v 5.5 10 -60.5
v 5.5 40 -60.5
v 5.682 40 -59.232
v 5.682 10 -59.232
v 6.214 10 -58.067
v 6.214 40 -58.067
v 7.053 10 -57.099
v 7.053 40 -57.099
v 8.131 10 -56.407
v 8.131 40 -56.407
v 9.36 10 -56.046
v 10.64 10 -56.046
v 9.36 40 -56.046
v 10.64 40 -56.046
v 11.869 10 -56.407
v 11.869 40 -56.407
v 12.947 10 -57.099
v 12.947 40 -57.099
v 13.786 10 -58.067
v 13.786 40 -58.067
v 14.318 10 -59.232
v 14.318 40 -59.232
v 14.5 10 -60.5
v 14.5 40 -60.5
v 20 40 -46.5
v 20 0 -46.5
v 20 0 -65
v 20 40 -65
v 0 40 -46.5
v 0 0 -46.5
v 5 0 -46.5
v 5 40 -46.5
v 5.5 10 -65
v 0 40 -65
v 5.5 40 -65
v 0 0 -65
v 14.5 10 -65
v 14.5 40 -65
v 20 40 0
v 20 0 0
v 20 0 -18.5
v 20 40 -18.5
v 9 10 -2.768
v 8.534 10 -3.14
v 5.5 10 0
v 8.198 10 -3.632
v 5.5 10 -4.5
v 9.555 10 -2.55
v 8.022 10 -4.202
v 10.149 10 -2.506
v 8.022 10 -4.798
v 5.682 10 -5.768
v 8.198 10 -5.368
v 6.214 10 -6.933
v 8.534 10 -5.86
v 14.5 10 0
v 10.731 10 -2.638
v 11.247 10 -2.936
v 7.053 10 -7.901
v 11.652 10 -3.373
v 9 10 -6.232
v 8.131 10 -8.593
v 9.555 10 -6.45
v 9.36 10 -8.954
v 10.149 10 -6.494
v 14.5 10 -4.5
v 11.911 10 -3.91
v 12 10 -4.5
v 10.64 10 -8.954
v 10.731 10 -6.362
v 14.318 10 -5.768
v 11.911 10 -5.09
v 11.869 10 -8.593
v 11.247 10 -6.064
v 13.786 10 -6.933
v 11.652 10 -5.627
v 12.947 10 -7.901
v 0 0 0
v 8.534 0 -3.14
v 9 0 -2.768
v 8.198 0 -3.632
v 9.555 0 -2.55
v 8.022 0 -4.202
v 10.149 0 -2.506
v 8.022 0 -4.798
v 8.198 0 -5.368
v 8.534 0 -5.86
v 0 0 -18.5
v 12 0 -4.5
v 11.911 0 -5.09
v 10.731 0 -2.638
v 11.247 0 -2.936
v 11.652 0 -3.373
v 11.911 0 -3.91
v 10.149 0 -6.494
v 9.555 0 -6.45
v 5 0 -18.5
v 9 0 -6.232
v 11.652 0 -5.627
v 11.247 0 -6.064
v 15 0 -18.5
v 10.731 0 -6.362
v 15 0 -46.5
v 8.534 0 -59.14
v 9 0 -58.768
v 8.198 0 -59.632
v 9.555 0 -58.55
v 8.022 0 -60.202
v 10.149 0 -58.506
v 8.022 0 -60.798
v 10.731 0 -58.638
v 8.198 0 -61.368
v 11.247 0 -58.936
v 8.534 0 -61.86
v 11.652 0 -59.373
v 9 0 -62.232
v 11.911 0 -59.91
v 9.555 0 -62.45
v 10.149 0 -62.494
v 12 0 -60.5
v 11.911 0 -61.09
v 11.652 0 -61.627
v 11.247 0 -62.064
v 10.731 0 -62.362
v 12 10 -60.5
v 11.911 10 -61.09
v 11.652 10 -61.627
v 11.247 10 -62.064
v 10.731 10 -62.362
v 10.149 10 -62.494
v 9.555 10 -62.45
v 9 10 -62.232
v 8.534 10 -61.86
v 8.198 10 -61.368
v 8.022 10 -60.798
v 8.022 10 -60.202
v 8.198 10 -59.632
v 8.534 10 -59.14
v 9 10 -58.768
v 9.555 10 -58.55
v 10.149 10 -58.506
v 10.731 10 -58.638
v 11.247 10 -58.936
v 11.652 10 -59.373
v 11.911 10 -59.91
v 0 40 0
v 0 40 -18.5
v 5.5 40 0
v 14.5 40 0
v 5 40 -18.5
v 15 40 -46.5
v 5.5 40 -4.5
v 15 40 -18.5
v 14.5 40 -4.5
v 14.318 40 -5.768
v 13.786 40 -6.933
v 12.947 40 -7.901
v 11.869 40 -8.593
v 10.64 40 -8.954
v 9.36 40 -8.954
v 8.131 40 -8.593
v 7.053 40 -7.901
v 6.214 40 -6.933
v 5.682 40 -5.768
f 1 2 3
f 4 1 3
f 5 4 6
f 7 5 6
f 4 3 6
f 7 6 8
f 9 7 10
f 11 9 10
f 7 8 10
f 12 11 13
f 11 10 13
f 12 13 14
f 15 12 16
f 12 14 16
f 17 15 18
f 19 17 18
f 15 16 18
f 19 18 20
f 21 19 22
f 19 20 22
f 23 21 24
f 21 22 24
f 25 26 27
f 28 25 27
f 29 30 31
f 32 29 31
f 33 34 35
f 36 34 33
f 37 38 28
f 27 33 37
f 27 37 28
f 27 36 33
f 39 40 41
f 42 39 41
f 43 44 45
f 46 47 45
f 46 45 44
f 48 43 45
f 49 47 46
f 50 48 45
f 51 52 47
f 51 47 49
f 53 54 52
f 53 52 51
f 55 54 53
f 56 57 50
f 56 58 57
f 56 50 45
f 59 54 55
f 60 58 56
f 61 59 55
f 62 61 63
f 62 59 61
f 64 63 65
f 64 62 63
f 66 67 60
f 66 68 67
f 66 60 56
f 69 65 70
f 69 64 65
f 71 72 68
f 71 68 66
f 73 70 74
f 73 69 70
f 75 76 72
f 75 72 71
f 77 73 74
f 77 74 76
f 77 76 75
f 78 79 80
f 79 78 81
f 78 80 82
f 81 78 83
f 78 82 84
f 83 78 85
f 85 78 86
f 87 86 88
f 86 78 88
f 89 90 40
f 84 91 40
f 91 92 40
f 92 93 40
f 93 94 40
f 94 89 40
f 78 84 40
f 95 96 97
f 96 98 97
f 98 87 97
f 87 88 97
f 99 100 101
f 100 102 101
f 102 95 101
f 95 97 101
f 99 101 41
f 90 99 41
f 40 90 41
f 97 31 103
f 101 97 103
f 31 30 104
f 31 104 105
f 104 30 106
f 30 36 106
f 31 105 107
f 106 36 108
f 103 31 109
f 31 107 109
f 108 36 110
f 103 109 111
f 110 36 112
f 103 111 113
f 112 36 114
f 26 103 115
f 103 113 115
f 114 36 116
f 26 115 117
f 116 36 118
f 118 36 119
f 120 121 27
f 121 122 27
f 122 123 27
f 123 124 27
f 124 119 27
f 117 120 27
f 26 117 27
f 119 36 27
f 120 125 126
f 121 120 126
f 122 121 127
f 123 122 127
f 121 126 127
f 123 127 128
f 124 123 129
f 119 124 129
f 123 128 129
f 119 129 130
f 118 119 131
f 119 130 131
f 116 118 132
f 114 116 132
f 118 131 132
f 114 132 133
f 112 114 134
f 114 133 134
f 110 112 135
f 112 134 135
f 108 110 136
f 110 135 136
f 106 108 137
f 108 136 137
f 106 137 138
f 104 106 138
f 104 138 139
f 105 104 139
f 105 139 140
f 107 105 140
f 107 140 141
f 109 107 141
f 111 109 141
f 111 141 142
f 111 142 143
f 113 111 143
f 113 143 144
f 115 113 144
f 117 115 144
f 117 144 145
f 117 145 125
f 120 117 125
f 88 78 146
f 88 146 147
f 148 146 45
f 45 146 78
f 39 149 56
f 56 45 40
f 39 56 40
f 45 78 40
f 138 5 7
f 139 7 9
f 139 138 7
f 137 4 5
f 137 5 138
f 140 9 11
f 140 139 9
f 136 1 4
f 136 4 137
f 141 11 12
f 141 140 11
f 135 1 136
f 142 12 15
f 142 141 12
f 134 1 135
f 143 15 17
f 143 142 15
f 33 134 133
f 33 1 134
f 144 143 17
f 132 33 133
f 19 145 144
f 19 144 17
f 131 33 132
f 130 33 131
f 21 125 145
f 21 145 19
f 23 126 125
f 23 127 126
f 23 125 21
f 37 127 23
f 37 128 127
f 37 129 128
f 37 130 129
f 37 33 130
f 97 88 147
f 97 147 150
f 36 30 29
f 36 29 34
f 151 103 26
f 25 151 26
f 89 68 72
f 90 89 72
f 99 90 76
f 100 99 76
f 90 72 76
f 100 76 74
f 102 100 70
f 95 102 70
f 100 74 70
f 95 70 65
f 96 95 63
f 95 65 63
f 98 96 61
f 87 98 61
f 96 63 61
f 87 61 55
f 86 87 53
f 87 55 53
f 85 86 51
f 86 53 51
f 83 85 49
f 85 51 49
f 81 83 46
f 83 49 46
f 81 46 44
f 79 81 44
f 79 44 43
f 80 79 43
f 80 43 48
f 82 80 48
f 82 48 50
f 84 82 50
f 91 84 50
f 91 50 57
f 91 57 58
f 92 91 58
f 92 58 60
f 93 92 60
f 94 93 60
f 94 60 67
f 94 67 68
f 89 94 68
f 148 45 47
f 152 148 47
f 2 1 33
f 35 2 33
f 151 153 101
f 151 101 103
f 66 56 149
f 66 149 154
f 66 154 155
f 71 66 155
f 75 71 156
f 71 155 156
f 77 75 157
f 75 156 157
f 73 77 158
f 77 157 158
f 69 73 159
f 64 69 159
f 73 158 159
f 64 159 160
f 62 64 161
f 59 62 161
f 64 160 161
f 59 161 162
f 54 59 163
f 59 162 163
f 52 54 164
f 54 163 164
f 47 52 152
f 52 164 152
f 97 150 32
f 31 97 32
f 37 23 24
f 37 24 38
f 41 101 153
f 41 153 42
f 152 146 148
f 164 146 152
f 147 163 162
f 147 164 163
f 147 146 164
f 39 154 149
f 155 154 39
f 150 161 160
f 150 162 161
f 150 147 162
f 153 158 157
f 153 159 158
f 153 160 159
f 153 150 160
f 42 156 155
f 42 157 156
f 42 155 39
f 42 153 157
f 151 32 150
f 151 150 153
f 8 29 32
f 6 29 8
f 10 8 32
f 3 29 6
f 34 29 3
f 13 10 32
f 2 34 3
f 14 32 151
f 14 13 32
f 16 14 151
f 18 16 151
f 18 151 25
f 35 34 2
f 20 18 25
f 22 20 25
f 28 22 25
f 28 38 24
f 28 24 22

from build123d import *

# Parameters (mm, degrees)
SKETCH1_W           = 20
SKETCH1_H           = 65
BOSS_EXTRUDE1_DEPTH = 40
SKETCH2_R           = 2
SKETCH2_W           = 5
SKETCH2_H           = 28
CUT_EXTRUDE1_DEPTH  = 40
SKETCH4_R           = 4.5
SKETCH4_W           = 9
SKETCH4_H           = 4.5
CUT_EXTRUDE4_DEPTH  = 30


with BuildPart() as part:
    # Sketch1 → Boss-Extrude1 (new body)
    with BuildSketch(Plane(origin=(0, 0, 0), x_dir=(1, 0, 0), z_dir=(0, 1, 0))):
        with Locations((10, 32.5)):
            Rectangle(SKETCH1_W, SKETCH1_H)
    extrude(amount=BOSS_EXTRUDE1_DEPTH)

    # Sketch2 → Cut-Extrude1 (cut)
    with BuildSketch(Plane(origin=(0, 40, 0), x_dir=(1, 0, 0), z_dir=(0, 1, 0))):
        with Locations((10, 60.5)):
            Circle(SKETCH2_R)
        with Locations((10, 4.5)):
            Circle(SKETCH2_R)
        with Locations((17.5, 32.5)):
            Rectangle(SKETCH2_W, SKETCH2_H)
        with Locations((2.5, 32.5)):
            Rectangle(SKETCH2_W, SKETCH2_H)
    extrude(amount=-CUT_EXTRUDE1_DEPTH, mode=Mode.SUBTRACT)

    # Sketch4 → Cut-Extrude4 (cut)
    with BuildSketch(Plane(origin=(0, 40, 0), x_dir=(1, 0, 0), z_dir=(0, 1, 0))):
        with Locations((10, 4.5)):
            Circle(SKETCH4_R)
        with Locations((10, 60.5)):
            Circle(SKETCH4_R)
        with Locations((10, 2.25)):
            Rectangle(SKETCH4_W, SKETCH4_H)
        with Locations((10, 62.75)):
            Rectangle(SKETCH4_W, SKETCH4_H)
    extrude(amount=-CUT_EXTRUDE4_DEPTH, mode=Mode.SUBTRACT)


solid = part.part
